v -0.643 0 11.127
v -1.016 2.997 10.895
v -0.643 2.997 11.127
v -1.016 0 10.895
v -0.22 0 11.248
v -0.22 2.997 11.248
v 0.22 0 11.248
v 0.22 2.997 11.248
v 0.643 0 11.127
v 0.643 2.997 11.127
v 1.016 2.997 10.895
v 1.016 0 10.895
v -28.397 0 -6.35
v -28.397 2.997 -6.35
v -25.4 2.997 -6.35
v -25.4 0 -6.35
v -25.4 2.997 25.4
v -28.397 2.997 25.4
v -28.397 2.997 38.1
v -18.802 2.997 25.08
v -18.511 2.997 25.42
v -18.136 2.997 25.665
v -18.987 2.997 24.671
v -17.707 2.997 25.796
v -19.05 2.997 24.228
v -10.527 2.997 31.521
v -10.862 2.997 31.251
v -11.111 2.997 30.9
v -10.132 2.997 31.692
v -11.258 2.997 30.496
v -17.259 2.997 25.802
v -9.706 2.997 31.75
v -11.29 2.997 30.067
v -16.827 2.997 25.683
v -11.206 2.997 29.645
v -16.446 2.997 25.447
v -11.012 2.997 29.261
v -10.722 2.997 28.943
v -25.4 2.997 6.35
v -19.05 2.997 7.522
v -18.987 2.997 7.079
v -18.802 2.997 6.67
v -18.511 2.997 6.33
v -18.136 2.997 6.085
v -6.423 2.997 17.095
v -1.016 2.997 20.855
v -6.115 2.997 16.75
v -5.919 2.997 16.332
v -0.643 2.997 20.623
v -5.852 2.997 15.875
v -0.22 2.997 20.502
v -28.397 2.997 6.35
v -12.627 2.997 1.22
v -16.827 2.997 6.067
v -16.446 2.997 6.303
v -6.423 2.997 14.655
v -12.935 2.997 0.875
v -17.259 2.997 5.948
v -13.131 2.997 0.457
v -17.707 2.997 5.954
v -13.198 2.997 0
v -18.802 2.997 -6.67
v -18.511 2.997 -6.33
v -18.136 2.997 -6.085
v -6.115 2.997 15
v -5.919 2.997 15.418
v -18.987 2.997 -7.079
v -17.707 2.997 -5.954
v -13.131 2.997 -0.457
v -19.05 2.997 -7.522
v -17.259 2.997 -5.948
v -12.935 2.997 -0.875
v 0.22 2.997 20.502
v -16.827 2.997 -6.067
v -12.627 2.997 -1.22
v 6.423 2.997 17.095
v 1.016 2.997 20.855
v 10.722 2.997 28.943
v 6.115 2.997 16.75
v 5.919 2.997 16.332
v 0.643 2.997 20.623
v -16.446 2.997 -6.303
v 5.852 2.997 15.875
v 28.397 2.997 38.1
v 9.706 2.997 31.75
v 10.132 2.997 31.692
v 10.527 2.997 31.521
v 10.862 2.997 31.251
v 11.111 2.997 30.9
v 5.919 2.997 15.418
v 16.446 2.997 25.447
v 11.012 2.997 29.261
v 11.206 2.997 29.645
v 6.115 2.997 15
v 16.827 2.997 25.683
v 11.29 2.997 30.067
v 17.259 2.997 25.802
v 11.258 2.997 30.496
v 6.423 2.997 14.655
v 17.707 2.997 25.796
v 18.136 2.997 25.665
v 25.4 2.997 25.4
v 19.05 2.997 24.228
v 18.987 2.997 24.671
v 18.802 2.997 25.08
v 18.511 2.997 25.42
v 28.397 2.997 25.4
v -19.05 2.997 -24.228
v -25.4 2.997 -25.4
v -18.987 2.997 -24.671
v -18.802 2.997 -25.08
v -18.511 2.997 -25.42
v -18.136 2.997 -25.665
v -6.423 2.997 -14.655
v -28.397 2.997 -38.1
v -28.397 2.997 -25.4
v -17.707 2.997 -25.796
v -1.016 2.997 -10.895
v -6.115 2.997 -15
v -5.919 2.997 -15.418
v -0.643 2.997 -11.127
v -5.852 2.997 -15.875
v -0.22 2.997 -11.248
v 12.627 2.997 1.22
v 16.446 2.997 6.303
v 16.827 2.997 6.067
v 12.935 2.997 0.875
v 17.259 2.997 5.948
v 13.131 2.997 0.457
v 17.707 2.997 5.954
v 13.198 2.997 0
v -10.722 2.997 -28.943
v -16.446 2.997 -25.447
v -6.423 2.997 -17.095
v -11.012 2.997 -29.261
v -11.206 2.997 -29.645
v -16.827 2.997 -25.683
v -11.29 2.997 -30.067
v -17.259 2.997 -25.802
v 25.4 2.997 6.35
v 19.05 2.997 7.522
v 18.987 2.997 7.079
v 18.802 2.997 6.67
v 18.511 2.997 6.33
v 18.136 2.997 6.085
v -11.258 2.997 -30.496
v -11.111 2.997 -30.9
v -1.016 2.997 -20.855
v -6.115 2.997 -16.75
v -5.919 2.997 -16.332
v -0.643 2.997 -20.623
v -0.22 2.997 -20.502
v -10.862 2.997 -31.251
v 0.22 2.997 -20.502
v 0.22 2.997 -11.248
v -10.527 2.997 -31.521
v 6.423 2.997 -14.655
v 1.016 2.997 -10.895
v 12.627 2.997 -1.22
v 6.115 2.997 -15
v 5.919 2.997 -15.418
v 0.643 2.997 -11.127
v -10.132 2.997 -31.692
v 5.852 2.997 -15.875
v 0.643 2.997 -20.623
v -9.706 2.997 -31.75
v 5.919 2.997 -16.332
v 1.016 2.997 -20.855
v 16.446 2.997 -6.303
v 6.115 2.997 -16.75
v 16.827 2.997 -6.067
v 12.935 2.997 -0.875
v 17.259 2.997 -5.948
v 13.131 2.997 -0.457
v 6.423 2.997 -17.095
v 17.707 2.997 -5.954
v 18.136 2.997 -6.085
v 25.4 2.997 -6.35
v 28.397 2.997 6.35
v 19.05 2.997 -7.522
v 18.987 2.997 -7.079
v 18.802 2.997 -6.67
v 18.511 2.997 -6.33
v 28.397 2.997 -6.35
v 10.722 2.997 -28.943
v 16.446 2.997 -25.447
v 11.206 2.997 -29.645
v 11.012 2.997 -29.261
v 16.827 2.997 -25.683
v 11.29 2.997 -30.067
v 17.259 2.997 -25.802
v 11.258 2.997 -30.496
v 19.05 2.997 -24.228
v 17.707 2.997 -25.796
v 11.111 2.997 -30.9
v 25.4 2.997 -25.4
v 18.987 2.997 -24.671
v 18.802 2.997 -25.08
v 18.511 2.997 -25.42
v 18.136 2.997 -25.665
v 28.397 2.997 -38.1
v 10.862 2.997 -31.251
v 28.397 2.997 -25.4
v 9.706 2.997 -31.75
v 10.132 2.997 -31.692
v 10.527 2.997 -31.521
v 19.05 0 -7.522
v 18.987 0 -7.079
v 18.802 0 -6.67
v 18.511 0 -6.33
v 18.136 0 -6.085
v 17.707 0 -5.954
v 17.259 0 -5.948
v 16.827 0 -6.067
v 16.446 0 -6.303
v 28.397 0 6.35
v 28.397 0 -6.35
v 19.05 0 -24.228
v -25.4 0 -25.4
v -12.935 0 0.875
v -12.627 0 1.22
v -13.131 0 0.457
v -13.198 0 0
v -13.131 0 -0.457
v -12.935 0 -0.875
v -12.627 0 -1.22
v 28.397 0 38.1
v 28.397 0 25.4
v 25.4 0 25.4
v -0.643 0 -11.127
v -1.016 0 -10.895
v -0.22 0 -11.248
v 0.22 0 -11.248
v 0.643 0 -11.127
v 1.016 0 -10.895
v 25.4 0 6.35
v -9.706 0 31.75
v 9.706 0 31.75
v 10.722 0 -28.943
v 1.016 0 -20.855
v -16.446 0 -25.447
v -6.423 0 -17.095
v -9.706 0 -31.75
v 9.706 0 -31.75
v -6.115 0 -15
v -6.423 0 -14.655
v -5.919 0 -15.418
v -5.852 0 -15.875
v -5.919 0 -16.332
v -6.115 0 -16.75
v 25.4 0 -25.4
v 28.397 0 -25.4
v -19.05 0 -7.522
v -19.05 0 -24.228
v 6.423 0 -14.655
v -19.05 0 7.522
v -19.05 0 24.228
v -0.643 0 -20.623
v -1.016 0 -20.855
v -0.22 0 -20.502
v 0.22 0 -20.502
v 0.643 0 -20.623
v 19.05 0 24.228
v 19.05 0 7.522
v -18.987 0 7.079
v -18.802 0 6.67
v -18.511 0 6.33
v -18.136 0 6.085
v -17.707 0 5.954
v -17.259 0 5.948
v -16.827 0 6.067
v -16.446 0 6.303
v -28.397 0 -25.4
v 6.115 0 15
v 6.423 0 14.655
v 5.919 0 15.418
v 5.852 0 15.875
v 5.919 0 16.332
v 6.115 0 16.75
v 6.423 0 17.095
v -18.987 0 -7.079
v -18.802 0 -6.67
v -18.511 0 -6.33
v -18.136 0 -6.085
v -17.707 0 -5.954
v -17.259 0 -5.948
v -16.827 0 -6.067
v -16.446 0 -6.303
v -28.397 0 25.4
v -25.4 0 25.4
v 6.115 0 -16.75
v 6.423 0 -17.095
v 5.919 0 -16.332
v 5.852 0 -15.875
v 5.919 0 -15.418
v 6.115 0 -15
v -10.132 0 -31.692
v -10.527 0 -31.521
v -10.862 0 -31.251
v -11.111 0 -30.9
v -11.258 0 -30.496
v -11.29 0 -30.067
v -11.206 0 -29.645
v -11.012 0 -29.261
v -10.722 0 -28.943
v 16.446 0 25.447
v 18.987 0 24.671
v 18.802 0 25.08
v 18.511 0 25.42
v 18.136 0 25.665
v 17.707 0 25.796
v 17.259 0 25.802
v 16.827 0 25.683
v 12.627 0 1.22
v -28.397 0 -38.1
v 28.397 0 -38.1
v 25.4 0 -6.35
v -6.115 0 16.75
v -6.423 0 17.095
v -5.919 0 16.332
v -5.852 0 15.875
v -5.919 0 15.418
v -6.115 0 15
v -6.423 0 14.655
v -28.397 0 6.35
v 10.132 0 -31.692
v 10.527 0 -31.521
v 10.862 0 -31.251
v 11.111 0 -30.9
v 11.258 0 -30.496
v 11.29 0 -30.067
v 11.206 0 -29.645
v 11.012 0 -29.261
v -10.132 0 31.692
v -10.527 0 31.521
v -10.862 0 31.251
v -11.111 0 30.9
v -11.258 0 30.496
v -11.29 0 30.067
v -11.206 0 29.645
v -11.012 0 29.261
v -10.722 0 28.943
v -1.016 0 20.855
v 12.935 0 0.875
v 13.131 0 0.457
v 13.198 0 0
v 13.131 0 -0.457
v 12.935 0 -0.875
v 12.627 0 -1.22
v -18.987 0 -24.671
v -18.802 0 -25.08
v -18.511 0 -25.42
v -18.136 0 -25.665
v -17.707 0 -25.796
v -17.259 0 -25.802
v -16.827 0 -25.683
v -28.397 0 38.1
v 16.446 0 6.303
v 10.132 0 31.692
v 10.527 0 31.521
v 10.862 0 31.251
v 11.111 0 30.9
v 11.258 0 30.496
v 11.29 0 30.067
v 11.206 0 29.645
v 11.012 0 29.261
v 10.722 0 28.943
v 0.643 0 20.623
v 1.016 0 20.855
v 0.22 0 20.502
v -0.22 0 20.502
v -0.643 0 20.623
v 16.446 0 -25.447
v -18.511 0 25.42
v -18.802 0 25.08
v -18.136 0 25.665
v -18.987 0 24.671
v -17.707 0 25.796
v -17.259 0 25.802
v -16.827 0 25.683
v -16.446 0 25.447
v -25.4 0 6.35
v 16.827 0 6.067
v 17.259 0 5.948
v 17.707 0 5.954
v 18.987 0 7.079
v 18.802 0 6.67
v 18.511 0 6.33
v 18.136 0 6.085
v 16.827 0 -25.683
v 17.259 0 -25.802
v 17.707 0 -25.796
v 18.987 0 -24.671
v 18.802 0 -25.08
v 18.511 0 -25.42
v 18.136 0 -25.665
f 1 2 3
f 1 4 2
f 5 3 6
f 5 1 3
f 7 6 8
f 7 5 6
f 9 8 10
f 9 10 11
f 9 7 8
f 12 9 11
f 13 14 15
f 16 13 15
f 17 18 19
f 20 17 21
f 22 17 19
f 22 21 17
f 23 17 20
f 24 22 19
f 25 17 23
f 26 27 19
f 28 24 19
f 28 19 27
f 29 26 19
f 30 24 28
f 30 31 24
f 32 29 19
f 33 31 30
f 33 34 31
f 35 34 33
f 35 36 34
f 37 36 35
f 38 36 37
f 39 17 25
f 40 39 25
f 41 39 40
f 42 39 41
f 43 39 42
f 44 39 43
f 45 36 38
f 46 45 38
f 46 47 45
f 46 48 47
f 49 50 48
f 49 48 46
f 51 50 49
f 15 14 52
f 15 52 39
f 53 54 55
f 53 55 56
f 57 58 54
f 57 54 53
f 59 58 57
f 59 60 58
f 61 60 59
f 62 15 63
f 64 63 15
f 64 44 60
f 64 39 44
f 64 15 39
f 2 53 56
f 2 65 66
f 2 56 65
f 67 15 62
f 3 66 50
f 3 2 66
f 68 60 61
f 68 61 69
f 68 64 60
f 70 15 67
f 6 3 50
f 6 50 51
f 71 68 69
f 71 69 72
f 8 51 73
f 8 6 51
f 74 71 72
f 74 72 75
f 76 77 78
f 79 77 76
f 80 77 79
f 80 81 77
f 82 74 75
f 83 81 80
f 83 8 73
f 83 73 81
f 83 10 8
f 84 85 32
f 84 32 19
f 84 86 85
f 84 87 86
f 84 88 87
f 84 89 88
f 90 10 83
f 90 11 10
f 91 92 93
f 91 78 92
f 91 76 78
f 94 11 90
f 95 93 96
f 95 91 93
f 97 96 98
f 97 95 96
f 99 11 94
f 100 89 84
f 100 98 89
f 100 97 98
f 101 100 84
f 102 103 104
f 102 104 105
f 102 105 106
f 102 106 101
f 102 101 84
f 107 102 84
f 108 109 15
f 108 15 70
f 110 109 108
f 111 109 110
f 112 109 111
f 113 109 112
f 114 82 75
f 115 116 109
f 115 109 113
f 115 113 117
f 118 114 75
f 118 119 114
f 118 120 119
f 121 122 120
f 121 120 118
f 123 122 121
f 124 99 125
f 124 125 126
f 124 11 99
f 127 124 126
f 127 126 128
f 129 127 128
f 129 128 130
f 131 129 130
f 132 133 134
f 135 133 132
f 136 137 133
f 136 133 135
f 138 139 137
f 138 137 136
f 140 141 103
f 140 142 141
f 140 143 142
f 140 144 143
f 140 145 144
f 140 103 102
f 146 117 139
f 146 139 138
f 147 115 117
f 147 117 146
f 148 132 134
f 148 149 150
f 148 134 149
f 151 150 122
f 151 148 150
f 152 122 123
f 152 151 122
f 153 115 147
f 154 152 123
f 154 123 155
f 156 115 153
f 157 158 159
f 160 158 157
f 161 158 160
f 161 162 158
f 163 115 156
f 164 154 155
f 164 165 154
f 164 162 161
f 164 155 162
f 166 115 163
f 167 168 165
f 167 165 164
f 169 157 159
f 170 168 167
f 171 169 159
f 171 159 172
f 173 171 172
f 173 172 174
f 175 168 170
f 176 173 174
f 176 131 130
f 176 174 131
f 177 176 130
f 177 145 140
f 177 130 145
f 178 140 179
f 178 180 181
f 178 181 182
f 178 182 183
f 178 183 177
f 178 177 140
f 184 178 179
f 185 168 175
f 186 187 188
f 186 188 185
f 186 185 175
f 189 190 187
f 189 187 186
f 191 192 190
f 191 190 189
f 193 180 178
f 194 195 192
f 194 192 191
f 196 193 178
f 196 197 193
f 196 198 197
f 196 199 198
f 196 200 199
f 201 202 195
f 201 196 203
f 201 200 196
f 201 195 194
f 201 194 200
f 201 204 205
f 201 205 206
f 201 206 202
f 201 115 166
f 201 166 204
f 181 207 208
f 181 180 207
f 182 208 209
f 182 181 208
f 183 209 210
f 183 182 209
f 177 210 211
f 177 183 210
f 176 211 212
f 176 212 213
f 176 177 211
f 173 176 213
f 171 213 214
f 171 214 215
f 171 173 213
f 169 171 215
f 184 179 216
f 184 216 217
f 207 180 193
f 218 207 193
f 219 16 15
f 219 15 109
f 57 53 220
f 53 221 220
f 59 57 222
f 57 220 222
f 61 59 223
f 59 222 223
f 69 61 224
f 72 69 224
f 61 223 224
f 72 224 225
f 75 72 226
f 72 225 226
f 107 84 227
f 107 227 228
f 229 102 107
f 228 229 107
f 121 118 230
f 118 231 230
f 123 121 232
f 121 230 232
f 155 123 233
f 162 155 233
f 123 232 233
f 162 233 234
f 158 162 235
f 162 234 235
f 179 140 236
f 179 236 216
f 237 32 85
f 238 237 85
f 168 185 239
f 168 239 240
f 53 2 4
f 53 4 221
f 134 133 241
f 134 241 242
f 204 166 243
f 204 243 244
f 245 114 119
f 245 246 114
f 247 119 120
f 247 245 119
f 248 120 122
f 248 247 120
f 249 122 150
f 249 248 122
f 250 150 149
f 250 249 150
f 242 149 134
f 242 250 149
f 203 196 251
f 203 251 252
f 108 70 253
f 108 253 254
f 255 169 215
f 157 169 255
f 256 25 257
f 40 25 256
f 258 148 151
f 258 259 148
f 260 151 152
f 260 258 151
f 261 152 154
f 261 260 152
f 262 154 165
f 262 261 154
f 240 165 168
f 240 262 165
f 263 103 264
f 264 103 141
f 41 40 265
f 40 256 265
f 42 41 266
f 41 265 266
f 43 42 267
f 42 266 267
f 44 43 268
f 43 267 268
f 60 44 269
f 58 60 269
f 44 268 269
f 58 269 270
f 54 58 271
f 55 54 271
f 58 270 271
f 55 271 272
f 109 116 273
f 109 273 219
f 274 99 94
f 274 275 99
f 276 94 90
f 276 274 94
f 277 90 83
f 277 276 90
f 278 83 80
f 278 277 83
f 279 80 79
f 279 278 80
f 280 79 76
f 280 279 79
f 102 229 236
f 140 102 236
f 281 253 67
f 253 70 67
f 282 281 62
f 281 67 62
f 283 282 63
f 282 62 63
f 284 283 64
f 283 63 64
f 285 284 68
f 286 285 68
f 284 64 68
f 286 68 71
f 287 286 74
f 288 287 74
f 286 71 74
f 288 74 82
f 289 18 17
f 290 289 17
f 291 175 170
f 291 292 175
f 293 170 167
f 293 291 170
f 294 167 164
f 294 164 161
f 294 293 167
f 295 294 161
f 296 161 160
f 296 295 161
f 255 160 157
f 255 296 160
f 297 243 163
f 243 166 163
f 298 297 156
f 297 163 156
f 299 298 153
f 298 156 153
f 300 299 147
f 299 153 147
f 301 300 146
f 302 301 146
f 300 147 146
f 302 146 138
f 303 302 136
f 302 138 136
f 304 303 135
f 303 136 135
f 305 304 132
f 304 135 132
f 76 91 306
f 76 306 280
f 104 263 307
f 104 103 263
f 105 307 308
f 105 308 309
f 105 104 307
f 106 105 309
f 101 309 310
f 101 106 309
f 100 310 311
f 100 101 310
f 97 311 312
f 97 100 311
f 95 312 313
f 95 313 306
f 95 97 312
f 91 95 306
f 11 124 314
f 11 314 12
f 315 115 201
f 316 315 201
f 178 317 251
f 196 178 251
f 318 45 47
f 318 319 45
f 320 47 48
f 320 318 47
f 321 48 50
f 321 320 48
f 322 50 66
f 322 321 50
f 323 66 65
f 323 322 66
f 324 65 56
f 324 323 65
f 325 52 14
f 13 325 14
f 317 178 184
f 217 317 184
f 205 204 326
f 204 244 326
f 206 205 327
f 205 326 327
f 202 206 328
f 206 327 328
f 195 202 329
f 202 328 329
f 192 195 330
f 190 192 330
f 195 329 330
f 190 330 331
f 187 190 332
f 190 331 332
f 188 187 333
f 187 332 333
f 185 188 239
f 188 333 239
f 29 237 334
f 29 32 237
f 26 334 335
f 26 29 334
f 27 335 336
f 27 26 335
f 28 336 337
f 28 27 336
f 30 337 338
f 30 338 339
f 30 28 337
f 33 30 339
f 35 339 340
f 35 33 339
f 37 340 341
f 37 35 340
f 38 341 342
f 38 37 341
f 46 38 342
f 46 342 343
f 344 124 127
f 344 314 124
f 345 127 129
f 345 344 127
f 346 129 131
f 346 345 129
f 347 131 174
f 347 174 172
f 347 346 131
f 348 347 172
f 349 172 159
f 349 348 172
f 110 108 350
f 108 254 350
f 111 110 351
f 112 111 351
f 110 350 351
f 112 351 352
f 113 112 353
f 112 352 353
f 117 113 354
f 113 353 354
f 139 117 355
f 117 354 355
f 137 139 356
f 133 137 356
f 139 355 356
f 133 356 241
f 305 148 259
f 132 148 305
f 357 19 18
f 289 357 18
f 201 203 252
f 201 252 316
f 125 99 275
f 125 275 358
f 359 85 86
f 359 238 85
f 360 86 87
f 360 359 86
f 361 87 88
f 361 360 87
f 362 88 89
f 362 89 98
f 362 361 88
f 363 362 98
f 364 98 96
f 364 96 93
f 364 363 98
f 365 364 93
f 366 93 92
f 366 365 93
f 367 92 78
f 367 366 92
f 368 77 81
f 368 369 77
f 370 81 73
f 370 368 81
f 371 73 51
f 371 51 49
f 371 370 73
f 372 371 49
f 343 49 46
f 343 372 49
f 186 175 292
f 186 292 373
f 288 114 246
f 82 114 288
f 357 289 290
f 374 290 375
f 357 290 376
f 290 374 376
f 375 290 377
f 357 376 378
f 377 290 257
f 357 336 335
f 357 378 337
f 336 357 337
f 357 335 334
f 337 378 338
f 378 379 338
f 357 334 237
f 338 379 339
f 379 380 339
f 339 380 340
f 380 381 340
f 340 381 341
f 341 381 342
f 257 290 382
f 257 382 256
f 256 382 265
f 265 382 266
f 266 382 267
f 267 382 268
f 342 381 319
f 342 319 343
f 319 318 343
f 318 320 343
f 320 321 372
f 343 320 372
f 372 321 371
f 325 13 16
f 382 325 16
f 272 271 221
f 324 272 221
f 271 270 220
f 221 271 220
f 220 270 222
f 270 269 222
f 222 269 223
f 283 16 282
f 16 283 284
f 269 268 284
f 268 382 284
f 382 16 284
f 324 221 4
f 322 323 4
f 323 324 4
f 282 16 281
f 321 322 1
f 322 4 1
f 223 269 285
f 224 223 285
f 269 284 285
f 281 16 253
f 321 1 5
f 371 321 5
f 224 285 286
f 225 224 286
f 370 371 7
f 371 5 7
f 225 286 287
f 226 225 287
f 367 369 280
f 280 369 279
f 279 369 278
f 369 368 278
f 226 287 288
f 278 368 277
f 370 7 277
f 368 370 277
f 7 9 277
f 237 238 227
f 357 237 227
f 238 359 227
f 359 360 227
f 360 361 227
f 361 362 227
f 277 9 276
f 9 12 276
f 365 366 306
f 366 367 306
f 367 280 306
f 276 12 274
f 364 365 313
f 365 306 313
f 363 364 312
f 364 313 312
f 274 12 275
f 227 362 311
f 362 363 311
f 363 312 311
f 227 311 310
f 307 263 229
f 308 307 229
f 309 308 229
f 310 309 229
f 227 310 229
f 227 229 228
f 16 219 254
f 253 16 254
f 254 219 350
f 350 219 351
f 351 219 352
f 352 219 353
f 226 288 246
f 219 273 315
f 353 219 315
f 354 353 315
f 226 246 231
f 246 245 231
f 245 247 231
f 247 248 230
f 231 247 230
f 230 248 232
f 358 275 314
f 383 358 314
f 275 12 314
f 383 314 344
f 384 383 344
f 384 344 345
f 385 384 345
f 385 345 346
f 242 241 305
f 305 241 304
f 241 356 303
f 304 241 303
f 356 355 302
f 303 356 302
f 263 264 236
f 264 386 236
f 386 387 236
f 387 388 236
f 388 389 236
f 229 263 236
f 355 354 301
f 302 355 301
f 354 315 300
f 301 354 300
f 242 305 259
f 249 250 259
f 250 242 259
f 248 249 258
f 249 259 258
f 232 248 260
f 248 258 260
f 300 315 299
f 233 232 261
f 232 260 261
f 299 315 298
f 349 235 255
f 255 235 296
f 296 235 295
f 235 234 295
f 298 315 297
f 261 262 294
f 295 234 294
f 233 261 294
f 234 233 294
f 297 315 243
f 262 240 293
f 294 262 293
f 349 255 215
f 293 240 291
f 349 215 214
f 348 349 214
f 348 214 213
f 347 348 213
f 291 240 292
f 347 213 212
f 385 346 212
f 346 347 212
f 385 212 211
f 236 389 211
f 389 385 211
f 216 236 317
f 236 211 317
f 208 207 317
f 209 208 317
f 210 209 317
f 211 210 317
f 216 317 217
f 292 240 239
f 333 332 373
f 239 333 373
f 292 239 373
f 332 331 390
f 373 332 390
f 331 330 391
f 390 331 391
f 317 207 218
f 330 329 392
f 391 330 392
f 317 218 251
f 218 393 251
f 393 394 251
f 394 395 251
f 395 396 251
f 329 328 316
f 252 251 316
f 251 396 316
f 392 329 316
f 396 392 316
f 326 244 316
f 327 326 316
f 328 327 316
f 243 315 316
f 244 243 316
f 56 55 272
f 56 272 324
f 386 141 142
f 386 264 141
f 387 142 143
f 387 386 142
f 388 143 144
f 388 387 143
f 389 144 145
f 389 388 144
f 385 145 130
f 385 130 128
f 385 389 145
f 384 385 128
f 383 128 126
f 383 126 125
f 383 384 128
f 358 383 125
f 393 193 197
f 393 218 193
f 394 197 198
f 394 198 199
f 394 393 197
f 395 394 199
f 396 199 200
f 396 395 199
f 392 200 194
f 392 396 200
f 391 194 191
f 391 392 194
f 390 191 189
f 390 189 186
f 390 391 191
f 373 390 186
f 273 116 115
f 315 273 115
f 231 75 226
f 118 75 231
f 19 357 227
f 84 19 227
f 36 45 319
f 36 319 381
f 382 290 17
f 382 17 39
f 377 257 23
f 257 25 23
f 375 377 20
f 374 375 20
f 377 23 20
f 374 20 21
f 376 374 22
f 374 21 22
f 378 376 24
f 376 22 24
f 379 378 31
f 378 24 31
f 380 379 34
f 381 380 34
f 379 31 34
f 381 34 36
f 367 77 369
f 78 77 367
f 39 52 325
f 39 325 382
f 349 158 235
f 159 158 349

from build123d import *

# Parameters (mm, degrees)
SKETCH1_W           = 50.8
SKETCH1_H           = 76.2
BOSS_EXTRUDE1_DEPTH = 2.9972
SKETCH2_W           = 2.9972
SKETCH2_H           = 12.7
BOSS_EXTRUDE2_DEPTH = 2.9972
SKETCH3_W           = 38.1
SKETCH3_H           = 63.5
CUT_EXTRUDE1_DEPTH  = 48.612962265
EXTRUDE_THIN1_DEPTH = 2.9972
FILLET1_R           = 1.5875


with BuildPart() as part:
    # Sketch1 → Boss-Extrude1 (new body)
    with BuildSketch(Plane(origin=(0, 0, 0), x_dir=(1, 0, 0), z_dir=(0, 1, 0))):
        Rectangle(SKETCH1_W, SKETCH1_H)
    extrude(amount=BOSS_EXTRUDE1_DEPTH)

    # Sketch2 → Boss-Extrude2 (add)
    with BuildSketch(Plane(origin=(0, 2.9972, 0), x_dir=(1, 0, 0), z_dir=(0, 1, 0))):
        with Locations((26.8986, 0)):
            Rectangle(SKETCH2_W, SKETCH2_H)
        with Locations((26.8986, 31.75)):
            Rectangle(SKETCH2_W, SKETCH2_H)
        with Locations((26.8986, -31.75)):
            Rectangle(SKETCH2_W, SKETCH2_H)
        with Locations((-26.8986, 0)):
            Rectangle(SKETCH2_W, SKETCH2_H)
        with Locations((-26.8986, -31.75)):
            Rectangle(SKETCH2_W, SKETCH2_H)
        with Locations((-26.8986, 31.75)):
            Rectangle(SKETCH2_W, SKETCH2_H)
    extrude(amount=-BOSS_EXTRUDE2_DEPTH)

    # Sketch3 → Cut-Extrude1 (cut, through all)
    with BuildSketch(Plane(origin=(0, 2.9972, 0), x_dir=(1, 0, 0), z_dir=(0, 1, 0))):
        Rectangle(SKETCH3_W, SKETCH3_H)
    extrude(amount=-CUT_EXTRUDE1_DEPTH, mode=Mode.SUBTRACT)

    # Sketch4 → Extrude-Thin1 (add)
    with BuildSketch(Plane(origin=(0, 2.9972, 0), x_dir=(1, 0, 0), z_dir=(0, 1, 0))):
        Polygon((-21.082585469, 29.310897437), (14.090491456, 0), (-21.082585469, -29.310897437), (-17.017414531, -34.189102563), (24.009508544, 0), (-17.017414531, 34.189102563), align=None)
        Polygon((21.082585469, -29.310897437), (-14.090491456, 0), (21.082585469, 29.310897437), (17.017414531, 34.189102563), (-24.009508544, 0), (17.017414531, -34.189102563), align=None)
    extrude(amount=-EXTRUDE_THIN1_DEPTH)

    # Fillet1
    fillet1_edges = [part.edges().sort_by_distance(p)[0] for p in [
        (14.090491456, 1.4986, 31.75),
        (-14.090491456, 1.4986, 31.75),
        (19.05, 1.4986, -27.617076213),
        (19.05, 1.4986, 27.617076213),
        (19.05, 1.4986, 4.132923787),
        (19.05, 1.4986, -4.132923787),
        (14.090491456, 1.4986, -31.75),
        (-14.090491456, 1.4986, -31.75),
        (-19.05, 1.4986, -4.132923787),
        (-19.05, 1.4986, 4.132923787),
        (-19.05, 1.4986, -27.617076213),
        (-19.05, 1.4986, 27.617076213),
        (-4.959508544, 1.4986, 15.875),
        (-4.959508544, 1.4986, -15.875),
        (0, 1.4986, -20.007923787),
        (4.959508544, 1.4986, -15.875),
        (4.959508544, 1.4986, 15.875),
        (0, 1.4986, 20.007923787),
        (14.090491456, 1.4986, 0),
        (0, 1.4986, -11.742076213),
        (0, 1.4986, 11.742076213),
        (-14.090491456, 1.4986, 0),
    ]]
    fillet(fillet1_edges, radius=FILLET1_R)


solid = part.part
